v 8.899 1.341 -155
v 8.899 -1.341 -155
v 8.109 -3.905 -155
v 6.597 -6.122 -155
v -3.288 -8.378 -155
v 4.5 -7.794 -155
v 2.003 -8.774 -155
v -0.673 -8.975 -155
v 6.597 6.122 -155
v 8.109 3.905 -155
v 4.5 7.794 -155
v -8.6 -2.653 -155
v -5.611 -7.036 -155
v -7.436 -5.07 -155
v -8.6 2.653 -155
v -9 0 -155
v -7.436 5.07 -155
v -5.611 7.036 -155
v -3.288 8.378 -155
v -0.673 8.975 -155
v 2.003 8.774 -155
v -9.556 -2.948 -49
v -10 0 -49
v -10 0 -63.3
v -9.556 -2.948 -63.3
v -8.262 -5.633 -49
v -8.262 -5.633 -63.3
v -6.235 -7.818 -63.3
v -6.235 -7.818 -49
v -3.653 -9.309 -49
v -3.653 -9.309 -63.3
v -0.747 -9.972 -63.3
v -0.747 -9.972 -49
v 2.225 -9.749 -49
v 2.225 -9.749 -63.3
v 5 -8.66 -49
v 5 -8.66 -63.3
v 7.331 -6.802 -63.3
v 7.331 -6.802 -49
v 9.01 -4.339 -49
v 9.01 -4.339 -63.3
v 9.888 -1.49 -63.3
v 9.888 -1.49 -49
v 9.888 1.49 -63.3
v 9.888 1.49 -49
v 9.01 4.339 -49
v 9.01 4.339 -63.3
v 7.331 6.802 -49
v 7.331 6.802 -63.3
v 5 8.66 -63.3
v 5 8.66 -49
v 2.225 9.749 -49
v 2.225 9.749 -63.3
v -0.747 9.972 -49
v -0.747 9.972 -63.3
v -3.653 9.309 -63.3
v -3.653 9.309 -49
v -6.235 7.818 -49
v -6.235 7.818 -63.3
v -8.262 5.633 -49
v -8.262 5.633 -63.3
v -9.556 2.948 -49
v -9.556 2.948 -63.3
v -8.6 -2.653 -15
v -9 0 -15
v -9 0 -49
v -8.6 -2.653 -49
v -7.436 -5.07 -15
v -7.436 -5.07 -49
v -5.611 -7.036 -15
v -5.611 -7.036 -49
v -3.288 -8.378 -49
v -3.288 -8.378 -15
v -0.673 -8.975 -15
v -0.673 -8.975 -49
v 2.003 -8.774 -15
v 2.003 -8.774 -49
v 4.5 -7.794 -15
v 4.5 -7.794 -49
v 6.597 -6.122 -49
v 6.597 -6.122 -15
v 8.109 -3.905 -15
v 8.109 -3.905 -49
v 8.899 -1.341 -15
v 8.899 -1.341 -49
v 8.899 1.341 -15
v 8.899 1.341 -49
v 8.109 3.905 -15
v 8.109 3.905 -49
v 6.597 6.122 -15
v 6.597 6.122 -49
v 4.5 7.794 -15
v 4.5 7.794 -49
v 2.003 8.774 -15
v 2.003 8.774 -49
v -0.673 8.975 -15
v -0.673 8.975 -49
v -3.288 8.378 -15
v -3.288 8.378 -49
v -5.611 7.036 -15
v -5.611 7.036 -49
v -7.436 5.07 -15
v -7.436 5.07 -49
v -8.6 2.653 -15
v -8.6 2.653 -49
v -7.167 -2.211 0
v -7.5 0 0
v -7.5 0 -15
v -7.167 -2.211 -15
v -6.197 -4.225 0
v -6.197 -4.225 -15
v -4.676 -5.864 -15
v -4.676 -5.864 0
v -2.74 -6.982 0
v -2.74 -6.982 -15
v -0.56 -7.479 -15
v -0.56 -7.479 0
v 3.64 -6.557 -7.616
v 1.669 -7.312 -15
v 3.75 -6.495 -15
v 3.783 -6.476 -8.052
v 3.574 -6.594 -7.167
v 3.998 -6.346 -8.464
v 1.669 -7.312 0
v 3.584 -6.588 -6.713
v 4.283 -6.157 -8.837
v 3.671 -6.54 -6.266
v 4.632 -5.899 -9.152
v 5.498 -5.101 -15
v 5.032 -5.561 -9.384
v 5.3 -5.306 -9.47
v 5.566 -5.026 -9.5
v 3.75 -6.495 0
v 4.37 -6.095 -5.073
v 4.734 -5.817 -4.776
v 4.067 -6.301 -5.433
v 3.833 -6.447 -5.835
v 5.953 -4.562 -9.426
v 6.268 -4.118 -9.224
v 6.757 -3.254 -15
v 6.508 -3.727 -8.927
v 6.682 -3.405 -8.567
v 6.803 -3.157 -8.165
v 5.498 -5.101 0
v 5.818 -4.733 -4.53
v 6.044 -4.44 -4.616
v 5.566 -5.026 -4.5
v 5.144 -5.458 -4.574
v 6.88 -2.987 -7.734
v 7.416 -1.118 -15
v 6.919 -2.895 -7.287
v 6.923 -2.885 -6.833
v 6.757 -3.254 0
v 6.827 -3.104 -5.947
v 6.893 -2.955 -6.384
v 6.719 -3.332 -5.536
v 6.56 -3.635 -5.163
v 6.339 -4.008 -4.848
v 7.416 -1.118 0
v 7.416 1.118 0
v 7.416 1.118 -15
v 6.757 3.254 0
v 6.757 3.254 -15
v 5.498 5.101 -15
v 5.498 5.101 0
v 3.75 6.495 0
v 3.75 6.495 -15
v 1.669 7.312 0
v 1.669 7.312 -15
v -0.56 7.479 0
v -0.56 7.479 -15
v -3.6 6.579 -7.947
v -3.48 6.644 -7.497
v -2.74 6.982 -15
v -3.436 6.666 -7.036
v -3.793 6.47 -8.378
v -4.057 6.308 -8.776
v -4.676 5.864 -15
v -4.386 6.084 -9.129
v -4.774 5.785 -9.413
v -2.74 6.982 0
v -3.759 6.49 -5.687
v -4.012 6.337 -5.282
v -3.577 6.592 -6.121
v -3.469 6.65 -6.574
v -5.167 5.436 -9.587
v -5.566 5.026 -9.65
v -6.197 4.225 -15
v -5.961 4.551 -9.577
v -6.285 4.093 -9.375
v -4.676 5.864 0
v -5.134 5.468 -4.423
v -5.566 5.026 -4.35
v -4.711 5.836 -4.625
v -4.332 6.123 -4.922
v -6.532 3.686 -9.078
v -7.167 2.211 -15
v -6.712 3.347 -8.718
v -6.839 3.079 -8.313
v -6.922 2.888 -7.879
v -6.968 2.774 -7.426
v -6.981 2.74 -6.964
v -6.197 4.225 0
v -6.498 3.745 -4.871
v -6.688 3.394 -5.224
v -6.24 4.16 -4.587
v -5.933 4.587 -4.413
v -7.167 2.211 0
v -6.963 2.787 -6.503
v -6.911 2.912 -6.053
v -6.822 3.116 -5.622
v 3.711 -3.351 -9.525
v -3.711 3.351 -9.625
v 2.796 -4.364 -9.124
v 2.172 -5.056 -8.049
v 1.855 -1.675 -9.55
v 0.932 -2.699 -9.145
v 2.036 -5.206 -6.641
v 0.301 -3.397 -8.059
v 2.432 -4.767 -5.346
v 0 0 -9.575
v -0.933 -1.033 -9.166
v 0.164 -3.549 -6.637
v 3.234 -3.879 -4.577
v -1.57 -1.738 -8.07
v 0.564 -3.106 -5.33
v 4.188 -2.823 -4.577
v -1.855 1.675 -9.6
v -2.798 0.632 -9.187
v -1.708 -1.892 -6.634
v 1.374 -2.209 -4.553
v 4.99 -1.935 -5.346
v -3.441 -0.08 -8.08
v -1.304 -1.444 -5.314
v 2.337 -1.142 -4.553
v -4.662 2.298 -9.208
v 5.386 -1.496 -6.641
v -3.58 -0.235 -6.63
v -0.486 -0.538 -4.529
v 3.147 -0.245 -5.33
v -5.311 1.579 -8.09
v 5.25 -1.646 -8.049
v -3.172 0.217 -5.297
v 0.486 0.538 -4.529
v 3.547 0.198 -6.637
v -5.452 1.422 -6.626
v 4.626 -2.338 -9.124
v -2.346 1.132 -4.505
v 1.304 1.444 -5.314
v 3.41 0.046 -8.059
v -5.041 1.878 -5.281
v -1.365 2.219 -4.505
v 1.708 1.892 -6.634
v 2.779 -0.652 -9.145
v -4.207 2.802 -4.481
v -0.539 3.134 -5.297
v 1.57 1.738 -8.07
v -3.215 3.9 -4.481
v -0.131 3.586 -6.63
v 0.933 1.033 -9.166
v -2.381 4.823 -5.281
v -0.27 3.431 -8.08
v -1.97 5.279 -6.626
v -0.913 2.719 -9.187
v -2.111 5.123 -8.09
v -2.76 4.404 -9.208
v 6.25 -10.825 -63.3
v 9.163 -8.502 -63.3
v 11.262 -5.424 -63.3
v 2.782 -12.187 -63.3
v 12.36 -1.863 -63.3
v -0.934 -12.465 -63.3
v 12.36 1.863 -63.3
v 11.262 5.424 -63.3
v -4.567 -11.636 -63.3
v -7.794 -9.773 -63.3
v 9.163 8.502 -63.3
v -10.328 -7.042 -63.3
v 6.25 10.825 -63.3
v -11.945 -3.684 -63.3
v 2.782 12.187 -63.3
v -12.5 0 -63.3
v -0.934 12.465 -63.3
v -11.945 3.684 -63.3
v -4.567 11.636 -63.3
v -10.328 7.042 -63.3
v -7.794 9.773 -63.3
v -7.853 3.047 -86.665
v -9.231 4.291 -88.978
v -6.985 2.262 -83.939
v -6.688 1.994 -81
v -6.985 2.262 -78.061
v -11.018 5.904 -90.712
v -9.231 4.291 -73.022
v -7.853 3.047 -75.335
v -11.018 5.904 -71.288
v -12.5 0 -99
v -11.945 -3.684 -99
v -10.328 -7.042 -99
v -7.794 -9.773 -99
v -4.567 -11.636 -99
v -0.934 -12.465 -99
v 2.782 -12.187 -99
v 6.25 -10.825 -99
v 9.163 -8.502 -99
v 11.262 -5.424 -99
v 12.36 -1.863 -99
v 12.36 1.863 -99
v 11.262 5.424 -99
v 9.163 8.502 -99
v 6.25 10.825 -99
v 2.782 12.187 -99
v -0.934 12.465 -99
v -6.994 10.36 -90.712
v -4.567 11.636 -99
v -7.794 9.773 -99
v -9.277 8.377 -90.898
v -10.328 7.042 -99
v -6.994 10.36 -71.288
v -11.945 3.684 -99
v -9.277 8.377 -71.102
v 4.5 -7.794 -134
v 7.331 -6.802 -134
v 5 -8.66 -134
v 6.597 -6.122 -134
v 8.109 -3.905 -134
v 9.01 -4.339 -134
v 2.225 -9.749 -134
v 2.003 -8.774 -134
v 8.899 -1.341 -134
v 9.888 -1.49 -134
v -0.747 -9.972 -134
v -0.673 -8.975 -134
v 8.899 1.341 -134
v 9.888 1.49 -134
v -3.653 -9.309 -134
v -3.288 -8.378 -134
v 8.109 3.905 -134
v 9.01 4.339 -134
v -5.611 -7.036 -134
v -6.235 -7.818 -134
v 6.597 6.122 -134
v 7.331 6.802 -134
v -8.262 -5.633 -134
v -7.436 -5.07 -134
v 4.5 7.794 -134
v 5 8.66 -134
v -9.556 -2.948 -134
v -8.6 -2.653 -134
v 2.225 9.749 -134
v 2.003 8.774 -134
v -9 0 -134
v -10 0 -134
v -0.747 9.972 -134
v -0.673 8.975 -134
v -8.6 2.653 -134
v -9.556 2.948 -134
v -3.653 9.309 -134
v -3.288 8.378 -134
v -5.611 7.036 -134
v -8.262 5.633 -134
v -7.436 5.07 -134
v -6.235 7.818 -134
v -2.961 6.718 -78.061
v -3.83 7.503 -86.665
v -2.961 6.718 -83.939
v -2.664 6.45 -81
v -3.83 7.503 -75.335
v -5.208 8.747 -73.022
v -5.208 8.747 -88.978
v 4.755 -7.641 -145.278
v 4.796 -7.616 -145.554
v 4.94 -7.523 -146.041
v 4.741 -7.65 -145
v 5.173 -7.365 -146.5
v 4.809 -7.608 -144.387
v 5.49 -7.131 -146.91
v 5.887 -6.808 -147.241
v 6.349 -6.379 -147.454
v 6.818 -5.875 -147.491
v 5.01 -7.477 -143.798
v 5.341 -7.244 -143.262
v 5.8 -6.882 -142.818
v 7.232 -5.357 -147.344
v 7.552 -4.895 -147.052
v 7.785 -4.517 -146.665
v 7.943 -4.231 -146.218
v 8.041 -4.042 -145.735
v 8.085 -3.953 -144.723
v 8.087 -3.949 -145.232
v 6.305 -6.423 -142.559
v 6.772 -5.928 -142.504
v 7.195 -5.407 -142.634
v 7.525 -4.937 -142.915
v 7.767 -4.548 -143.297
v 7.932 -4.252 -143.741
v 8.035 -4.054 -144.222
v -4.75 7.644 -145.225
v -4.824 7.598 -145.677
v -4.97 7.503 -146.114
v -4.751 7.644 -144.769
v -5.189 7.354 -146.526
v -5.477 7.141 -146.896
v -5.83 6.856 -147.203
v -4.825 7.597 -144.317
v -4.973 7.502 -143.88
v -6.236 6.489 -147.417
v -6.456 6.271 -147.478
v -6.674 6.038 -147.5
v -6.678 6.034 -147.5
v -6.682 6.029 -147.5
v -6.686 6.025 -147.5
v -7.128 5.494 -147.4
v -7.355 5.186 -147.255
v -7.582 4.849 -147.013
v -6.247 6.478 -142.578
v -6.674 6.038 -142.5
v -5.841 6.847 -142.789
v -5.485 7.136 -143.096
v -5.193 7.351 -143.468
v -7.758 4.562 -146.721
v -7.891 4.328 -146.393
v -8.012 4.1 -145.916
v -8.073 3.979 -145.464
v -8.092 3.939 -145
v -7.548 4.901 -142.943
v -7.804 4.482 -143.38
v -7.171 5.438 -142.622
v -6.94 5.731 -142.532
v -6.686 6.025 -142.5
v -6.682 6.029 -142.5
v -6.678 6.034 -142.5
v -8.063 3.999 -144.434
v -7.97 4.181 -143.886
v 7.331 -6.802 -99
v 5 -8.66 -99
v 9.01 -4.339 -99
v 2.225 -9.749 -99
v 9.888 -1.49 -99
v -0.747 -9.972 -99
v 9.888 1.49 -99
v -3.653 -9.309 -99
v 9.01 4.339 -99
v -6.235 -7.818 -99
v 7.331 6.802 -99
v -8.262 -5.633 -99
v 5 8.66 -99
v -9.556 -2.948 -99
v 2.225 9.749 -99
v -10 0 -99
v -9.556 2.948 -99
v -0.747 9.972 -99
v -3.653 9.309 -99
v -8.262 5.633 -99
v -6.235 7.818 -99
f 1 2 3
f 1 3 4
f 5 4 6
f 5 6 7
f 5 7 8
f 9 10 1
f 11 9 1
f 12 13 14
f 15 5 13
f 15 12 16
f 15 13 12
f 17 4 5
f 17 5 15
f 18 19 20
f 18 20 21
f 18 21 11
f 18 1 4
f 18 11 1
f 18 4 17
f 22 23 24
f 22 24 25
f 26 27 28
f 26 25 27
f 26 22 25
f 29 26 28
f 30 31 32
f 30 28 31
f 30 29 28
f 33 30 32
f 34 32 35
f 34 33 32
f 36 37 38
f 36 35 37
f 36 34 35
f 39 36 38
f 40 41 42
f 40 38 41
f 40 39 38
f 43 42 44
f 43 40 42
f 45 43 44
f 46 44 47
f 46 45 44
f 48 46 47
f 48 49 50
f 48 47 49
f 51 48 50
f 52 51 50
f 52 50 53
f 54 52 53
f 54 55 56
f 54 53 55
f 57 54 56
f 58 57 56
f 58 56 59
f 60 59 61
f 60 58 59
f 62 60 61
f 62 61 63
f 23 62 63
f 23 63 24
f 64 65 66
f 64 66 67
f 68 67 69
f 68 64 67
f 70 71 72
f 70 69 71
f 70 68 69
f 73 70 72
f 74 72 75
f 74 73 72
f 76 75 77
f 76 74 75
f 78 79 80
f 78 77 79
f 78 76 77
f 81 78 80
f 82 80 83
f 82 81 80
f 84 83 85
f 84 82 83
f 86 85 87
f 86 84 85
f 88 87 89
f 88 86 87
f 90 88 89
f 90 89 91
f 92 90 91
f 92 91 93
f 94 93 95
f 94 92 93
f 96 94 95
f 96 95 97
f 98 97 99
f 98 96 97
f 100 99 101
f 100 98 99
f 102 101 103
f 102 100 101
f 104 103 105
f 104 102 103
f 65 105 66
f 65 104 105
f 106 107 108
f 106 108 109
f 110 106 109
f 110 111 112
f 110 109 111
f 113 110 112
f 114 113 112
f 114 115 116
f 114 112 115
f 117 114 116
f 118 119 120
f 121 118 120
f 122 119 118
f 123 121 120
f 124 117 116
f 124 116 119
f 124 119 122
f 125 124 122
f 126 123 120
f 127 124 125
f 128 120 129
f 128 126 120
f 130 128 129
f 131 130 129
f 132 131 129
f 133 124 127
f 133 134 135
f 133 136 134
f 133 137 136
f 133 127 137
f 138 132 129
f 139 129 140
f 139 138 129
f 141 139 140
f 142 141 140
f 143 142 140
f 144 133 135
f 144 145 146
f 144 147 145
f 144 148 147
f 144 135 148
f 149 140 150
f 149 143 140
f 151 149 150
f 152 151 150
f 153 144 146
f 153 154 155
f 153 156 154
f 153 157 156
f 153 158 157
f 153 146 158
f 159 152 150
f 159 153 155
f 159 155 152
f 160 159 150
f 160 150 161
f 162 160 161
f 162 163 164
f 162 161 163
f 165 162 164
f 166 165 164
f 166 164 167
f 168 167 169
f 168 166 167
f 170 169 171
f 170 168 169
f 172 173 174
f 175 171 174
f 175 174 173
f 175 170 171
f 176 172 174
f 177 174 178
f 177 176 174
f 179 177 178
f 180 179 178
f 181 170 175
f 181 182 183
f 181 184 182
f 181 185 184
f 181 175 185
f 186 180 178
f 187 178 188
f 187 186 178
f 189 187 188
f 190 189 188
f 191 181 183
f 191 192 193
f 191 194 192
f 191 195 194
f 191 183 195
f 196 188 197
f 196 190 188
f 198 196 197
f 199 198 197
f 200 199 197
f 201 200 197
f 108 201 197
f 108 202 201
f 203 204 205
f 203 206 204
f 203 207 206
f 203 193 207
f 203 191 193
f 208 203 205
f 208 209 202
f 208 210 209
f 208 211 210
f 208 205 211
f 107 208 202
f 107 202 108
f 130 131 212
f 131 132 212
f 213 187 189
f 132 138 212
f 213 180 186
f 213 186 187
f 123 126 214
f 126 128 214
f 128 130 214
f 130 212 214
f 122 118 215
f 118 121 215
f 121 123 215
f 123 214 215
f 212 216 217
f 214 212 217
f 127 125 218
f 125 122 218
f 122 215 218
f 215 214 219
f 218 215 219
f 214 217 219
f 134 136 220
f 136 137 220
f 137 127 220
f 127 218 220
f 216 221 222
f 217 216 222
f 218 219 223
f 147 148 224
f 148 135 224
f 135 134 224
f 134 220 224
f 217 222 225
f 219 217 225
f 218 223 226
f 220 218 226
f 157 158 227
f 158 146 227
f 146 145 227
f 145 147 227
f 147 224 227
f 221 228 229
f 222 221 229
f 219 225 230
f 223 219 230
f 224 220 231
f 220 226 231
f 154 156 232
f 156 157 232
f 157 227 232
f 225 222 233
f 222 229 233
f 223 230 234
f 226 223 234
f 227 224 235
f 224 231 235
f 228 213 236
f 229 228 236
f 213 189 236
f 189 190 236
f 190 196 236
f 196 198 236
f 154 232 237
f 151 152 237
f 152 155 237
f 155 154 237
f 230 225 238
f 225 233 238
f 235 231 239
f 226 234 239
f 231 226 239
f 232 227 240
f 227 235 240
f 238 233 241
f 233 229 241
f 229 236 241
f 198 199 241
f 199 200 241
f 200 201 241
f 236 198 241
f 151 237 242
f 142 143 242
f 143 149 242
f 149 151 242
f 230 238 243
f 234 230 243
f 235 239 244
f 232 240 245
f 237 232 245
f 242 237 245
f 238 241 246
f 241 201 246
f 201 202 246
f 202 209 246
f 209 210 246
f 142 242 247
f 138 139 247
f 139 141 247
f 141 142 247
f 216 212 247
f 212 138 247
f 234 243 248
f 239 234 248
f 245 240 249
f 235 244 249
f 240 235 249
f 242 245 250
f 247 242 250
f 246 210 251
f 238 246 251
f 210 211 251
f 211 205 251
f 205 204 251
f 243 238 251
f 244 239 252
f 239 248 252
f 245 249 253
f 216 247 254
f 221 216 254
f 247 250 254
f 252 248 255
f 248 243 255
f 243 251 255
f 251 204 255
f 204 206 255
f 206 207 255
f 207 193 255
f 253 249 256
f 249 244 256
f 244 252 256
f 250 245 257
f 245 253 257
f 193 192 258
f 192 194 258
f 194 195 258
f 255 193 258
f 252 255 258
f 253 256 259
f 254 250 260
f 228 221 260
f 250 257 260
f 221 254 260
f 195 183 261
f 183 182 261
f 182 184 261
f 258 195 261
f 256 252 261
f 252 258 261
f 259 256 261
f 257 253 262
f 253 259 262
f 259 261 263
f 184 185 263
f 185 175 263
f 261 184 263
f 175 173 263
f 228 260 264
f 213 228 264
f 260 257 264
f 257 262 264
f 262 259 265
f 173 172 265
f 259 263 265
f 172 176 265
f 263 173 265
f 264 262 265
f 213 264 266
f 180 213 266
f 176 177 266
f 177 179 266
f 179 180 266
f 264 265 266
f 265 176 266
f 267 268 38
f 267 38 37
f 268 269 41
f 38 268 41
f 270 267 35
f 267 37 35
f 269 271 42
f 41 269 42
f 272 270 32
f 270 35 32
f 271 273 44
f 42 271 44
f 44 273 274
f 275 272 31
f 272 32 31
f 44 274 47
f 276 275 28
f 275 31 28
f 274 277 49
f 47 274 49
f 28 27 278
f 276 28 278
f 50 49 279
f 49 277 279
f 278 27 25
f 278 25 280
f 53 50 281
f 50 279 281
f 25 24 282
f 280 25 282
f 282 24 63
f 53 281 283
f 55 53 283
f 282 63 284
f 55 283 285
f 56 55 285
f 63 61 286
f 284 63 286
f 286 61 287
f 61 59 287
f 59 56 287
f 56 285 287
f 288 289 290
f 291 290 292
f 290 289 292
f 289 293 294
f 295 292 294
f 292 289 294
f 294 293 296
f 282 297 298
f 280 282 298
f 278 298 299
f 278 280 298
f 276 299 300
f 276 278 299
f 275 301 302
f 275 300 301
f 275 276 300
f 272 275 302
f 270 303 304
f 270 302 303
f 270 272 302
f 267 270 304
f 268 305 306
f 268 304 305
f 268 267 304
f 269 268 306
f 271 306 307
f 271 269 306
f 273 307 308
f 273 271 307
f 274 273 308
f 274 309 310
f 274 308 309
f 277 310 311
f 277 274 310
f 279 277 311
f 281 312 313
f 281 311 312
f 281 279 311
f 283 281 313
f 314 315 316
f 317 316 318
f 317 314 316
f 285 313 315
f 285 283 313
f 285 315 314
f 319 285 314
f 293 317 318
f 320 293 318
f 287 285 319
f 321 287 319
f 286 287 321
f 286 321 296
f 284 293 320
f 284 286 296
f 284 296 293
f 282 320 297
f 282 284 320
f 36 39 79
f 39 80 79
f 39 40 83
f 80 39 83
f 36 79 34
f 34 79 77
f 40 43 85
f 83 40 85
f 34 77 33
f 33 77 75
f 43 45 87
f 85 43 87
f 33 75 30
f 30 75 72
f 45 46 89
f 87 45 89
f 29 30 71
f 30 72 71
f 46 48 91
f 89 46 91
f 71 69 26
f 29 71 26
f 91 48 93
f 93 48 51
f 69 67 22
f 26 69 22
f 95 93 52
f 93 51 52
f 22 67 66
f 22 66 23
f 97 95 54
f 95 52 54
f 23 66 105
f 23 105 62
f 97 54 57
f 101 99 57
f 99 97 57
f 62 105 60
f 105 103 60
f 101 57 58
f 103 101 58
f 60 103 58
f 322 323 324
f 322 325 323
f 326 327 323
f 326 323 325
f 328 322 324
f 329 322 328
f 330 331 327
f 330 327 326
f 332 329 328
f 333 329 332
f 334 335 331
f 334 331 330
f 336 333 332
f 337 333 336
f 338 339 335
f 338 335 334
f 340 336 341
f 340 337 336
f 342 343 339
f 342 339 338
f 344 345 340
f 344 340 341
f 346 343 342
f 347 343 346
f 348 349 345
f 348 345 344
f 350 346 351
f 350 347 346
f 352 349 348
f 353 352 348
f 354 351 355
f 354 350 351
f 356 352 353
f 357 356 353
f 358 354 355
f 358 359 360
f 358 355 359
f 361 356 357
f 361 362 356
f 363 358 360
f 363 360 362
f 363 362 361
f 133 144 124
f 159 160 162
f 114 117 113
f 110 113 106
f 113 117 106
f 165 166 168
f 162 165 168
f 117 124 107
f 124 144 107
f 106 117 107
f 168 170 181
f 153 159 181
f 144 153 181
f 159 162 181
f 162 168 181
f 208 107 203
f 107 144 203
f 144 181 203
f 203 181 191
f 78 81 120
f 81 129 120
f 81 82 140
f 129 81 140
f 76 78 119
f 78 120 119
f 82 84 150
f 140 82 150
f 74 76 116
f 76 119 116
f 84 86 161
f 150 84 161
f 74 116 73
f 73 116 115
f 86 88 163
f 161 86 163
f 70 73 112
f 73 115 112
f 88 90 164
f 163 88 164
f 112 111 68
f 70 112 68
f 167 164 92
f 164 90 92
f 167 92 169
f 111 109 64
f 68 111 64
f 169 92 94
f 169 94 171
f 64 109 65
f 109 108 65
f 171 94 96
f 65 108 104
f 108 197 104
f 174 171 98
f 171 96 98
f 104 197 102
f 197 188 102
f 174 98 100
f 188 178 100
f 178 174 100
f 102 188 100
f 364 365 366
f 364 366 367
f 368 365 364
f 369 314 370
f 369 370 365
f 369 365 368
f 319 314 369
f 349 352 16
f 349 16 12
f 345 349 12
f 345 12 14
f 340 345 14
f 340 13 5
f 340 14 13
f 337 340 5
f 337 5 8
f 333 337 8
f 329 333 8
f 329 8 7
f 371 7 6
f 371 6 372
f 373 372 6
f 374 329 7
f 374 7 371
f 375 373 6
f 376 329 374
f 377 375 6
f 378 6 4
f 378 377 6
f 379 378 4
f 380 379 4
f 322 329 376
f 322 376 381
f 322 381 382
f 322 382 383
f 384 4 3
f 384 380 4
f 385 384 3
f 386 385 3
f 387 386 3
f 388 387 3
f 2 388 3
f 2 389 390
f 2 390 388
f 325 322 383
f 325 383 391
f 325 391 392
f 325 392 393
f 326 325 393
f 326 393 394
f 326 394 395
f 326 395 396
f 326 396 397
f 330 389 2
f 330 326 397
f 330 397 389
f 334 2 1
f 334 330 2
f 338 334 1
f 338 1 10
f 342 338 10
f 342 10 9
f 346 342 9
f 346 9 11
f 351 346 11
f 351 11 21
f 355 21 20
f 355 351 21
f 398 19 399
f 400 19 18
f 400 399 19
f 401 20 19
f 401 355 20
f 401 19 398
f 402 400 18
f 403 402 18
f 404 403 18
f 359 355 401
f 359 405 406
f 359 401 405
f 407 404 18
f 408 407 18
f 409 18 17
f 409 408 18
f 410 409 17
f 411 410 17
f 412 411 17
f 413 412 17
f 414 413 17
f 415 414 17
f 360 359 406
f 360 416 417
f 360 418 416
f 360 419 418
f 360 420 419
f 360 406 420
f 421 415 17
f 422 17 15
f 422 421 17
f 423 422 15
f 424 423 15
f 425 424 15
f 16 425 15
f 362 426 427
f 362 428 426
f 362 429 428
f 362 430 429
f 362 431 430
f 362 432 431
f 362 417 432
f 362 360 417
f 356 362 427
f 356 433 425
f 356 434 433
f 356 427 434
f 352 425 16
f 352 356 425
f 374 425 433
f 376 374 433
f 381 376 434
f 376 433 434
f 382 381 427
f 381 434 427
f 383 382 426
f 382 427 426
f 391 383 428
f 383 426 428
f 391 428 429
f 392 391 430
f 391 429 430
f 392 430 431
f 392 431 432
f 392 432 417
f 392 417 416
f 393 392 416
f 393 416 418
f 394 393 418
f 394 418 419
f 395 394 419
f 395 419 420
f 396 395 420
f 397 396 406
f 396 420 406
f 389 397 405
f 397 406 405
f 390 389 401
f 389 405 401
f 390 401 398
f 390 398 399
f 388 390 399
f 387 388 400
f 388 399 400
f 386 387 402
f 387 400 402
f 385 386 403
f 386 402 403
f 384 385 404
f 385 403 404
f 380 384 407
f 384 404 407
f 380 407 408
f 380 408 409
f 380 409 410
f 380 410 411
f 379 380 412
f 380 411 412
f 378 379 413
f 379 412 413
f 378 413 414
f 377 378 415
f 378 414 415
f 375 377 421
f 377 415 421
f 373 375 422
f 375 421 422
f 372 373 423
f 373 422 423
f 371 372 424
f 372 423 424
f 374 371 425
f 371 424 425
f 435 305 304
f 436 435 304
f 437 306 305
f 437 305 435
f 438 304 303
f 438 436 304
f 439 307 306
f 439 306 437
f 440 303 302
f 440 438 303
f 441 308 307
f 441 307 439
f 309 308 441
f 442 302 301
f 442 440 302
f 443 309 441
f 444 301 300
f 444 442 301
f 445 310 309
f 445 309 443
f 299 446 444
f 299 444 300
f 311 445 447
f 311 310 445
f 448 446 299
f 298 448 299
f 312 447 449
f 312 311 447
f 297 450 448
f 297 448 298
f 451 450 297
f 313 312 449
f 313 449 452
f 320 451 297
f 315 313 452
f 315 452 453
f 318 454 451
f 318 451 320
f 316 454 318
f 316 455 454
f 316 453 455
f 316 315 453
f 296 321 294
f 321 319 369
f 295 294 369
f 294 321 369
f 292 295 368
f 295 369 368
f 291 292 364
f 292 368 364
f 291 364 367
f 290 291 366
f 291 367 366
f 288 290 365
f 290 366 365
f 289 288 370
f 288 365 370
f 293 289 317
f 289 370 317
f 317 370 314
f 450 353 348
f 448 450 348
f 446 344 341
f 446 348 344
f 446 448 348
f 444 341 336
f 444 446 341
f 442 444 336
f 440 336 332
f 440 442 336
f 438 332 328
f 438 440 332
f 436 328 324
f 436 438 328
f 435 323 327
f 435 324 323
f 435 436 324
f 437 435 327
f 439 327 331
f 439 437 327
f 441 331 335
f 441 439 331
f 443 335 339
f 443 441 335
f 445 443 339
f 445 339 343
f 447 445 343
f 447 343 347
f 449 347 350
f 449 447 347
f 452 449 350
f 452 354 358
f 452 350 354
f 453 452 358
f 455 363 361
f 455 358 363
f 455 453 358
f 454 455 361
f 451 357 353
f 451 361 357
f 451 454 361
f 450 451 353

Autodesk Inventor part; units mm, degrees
ref_plane "YZ Plane" through (0, 0, 0) normal (1, 0, 0) x (0, 1, 0)
ref_plane "XZ Plane" through (0, 0, 0) normal (0, 1, 0) x (-1, 0, 0)
sketch "Sketch1" plane through (0, 0, 0) normal (0, 1, 0) x (-1, 0, 0)
  line L0 (0, 0) -> (0, -155)
  line L1 (0, -155) -> (9, -155)
  line L2 (9, -155) -> (9, -134)
  line L3 (9, -134) -> (10, -134)
  line L4 (10, -134) -> (10, -99)
  line L5 (10, -99) -> (12.5, -99)
  line L6 (12.5, -99) -> (12.5, -63.3)
  line L7 (12.5, -63.3) -> (10, -63.3)
  line L8 (10, -63.3) -> (10, -49)
  line L9 (10, -49) -> (9, -49)
  line L10 (9, -49) -> (9, -15)
  line L11 (9, -15) -> (7.5, -15)
  line L12 (7.5, -15) -> (7.5, 0)
  line L13 (7.5, 0) -> (0, 0)
  dimension "d1" = 155
  dimension "d2" = 9
  dimension "d3" = 21
  dimension "d4" = 1
  dimension "d5" = 35
  dimension "d6" = 2.5
  dimension "d7" = 35.7
  dimension "d8" = 2.5
  dimension "d9" = 14.3
  dimension "d10" = 1
  dimension "d11" = 34
  dimension "d12" = 1.5
  dimension "d13" = 15
revolve "Revolution1" add sketch "Sketch1" angle 360 about axis through (0, 0, 0) along (0, 0, -1)
sketch "Sketch2" plane through (0, 0, -155) normal (0, 0, -1) x (-1, 0, 0)
  circle A0 centre (0, 0) radius 9 projected
  circle A1 centre (0, 0) radius 7.5 projected
  point P0 (6.6798, 6.0316)
ref_plane "Work Plane1" through (-6.6798, 6.0316, -155) normal (-0.7421989, 0.6701796, 0) x (-0.6701796, -0.7421989, 0)
sketch "Sketch3" plane through (-6.6798, 6.0316, -155) normal (-0.7421989, 0.6701796, 0) x (-0.6701796, -0.7421989, 0)
  line L0 (-9, 0) -> (9, 0) projected
  circle A0 centre (0, 10) radius 2.5
  point P0 (0, 155)
  dimension "d17" = 5
  dimension "d18" = 10
extrude "Extrusion1" cut sketch "Sketch3" against normal through all
ref_plane "Work Plane2" through (0, 0, 0) normal (-0.6701796, -0.7421989, 0) x (0, 0, 1)
sketch "Sketch4" plane through (0, 0, 0) normal (-0.6701796, -0.7421989, 0) x (0, 0, 1)
  line L0 (-99, 12.5) -> (-99, -12.5) projected
  line L1 (-57, 0) -> (-57, 17.3) construction
  line L2 (-81, 17.2999) -> (-81, -8.0858) construction
  line L3 (-57, 17.3) -> (-99, 17.3) construction
  arc A0 (-90.8975, 12.5) -> (-71.1025, 12.5) centre (-81, 17.2999) ccw
  line L4 (-63.3, 12.5) -> (-99, 12.5) projected
  point P0 (0, 0)
  dimension "d22" = 17.3
  dimension "d24" = 18
  dimension "d25" = 24
  dimension "d27" = 11
  dimension "d28" = 19.795
extrude "Extrusion2" cut sketch "Sketch4" along normal mid plane 6
sketch "Sketch5" plane through (0, 0, 0) normal (-0.6701796, -0.7421989, 0) x (0, 0, 1)
  line L0 (-15, 9) -> (-15, -9) projected
  line L1 (-15, 9) -> (-7, 9) construction
  line L2 (-15, 9) -> (-49, 9) construction
  line L3 (-7, 9) -> (-7, 7.5) construction
  line L4 (0, 7.5) -> (-15, 7.5) construction
  line L5 (-7, 7.5) -> (-9.65, 7.5) construction
  line L6 (-7, 7.5) -> (-7, -7.5) construction
  line L7 (0, -7.5) -> (-15, -7.5) construction
  line L8 (-7, -7.5) -> (-9.5, -7.5) construction
  line L9 (-9.5, -7.5) -> (-9.65, 7.5) construction
  line L10 (-7, 7.5) -> (-9.65, 7.5)
  line L11 (-9.5, -7.5) -> (-7, -7.5)
  line L12 (-7, 7.5) -> (-7, -7.5)
  line L13 (-9.5, -7.5) -> (-9.65, 7.5)
  point P0 (0, 0)
  dimension "d31" = 8
  dimension "d41" = 2.65
  dimension "d42" = 2.5
revolve "Revolution2" cut sketch "Sketch5" angle 360 about axis through (-5.5665, 5.0263, -7) along (0.7421989, -0.6701796, 0)
properties part number "laborator2 final"
